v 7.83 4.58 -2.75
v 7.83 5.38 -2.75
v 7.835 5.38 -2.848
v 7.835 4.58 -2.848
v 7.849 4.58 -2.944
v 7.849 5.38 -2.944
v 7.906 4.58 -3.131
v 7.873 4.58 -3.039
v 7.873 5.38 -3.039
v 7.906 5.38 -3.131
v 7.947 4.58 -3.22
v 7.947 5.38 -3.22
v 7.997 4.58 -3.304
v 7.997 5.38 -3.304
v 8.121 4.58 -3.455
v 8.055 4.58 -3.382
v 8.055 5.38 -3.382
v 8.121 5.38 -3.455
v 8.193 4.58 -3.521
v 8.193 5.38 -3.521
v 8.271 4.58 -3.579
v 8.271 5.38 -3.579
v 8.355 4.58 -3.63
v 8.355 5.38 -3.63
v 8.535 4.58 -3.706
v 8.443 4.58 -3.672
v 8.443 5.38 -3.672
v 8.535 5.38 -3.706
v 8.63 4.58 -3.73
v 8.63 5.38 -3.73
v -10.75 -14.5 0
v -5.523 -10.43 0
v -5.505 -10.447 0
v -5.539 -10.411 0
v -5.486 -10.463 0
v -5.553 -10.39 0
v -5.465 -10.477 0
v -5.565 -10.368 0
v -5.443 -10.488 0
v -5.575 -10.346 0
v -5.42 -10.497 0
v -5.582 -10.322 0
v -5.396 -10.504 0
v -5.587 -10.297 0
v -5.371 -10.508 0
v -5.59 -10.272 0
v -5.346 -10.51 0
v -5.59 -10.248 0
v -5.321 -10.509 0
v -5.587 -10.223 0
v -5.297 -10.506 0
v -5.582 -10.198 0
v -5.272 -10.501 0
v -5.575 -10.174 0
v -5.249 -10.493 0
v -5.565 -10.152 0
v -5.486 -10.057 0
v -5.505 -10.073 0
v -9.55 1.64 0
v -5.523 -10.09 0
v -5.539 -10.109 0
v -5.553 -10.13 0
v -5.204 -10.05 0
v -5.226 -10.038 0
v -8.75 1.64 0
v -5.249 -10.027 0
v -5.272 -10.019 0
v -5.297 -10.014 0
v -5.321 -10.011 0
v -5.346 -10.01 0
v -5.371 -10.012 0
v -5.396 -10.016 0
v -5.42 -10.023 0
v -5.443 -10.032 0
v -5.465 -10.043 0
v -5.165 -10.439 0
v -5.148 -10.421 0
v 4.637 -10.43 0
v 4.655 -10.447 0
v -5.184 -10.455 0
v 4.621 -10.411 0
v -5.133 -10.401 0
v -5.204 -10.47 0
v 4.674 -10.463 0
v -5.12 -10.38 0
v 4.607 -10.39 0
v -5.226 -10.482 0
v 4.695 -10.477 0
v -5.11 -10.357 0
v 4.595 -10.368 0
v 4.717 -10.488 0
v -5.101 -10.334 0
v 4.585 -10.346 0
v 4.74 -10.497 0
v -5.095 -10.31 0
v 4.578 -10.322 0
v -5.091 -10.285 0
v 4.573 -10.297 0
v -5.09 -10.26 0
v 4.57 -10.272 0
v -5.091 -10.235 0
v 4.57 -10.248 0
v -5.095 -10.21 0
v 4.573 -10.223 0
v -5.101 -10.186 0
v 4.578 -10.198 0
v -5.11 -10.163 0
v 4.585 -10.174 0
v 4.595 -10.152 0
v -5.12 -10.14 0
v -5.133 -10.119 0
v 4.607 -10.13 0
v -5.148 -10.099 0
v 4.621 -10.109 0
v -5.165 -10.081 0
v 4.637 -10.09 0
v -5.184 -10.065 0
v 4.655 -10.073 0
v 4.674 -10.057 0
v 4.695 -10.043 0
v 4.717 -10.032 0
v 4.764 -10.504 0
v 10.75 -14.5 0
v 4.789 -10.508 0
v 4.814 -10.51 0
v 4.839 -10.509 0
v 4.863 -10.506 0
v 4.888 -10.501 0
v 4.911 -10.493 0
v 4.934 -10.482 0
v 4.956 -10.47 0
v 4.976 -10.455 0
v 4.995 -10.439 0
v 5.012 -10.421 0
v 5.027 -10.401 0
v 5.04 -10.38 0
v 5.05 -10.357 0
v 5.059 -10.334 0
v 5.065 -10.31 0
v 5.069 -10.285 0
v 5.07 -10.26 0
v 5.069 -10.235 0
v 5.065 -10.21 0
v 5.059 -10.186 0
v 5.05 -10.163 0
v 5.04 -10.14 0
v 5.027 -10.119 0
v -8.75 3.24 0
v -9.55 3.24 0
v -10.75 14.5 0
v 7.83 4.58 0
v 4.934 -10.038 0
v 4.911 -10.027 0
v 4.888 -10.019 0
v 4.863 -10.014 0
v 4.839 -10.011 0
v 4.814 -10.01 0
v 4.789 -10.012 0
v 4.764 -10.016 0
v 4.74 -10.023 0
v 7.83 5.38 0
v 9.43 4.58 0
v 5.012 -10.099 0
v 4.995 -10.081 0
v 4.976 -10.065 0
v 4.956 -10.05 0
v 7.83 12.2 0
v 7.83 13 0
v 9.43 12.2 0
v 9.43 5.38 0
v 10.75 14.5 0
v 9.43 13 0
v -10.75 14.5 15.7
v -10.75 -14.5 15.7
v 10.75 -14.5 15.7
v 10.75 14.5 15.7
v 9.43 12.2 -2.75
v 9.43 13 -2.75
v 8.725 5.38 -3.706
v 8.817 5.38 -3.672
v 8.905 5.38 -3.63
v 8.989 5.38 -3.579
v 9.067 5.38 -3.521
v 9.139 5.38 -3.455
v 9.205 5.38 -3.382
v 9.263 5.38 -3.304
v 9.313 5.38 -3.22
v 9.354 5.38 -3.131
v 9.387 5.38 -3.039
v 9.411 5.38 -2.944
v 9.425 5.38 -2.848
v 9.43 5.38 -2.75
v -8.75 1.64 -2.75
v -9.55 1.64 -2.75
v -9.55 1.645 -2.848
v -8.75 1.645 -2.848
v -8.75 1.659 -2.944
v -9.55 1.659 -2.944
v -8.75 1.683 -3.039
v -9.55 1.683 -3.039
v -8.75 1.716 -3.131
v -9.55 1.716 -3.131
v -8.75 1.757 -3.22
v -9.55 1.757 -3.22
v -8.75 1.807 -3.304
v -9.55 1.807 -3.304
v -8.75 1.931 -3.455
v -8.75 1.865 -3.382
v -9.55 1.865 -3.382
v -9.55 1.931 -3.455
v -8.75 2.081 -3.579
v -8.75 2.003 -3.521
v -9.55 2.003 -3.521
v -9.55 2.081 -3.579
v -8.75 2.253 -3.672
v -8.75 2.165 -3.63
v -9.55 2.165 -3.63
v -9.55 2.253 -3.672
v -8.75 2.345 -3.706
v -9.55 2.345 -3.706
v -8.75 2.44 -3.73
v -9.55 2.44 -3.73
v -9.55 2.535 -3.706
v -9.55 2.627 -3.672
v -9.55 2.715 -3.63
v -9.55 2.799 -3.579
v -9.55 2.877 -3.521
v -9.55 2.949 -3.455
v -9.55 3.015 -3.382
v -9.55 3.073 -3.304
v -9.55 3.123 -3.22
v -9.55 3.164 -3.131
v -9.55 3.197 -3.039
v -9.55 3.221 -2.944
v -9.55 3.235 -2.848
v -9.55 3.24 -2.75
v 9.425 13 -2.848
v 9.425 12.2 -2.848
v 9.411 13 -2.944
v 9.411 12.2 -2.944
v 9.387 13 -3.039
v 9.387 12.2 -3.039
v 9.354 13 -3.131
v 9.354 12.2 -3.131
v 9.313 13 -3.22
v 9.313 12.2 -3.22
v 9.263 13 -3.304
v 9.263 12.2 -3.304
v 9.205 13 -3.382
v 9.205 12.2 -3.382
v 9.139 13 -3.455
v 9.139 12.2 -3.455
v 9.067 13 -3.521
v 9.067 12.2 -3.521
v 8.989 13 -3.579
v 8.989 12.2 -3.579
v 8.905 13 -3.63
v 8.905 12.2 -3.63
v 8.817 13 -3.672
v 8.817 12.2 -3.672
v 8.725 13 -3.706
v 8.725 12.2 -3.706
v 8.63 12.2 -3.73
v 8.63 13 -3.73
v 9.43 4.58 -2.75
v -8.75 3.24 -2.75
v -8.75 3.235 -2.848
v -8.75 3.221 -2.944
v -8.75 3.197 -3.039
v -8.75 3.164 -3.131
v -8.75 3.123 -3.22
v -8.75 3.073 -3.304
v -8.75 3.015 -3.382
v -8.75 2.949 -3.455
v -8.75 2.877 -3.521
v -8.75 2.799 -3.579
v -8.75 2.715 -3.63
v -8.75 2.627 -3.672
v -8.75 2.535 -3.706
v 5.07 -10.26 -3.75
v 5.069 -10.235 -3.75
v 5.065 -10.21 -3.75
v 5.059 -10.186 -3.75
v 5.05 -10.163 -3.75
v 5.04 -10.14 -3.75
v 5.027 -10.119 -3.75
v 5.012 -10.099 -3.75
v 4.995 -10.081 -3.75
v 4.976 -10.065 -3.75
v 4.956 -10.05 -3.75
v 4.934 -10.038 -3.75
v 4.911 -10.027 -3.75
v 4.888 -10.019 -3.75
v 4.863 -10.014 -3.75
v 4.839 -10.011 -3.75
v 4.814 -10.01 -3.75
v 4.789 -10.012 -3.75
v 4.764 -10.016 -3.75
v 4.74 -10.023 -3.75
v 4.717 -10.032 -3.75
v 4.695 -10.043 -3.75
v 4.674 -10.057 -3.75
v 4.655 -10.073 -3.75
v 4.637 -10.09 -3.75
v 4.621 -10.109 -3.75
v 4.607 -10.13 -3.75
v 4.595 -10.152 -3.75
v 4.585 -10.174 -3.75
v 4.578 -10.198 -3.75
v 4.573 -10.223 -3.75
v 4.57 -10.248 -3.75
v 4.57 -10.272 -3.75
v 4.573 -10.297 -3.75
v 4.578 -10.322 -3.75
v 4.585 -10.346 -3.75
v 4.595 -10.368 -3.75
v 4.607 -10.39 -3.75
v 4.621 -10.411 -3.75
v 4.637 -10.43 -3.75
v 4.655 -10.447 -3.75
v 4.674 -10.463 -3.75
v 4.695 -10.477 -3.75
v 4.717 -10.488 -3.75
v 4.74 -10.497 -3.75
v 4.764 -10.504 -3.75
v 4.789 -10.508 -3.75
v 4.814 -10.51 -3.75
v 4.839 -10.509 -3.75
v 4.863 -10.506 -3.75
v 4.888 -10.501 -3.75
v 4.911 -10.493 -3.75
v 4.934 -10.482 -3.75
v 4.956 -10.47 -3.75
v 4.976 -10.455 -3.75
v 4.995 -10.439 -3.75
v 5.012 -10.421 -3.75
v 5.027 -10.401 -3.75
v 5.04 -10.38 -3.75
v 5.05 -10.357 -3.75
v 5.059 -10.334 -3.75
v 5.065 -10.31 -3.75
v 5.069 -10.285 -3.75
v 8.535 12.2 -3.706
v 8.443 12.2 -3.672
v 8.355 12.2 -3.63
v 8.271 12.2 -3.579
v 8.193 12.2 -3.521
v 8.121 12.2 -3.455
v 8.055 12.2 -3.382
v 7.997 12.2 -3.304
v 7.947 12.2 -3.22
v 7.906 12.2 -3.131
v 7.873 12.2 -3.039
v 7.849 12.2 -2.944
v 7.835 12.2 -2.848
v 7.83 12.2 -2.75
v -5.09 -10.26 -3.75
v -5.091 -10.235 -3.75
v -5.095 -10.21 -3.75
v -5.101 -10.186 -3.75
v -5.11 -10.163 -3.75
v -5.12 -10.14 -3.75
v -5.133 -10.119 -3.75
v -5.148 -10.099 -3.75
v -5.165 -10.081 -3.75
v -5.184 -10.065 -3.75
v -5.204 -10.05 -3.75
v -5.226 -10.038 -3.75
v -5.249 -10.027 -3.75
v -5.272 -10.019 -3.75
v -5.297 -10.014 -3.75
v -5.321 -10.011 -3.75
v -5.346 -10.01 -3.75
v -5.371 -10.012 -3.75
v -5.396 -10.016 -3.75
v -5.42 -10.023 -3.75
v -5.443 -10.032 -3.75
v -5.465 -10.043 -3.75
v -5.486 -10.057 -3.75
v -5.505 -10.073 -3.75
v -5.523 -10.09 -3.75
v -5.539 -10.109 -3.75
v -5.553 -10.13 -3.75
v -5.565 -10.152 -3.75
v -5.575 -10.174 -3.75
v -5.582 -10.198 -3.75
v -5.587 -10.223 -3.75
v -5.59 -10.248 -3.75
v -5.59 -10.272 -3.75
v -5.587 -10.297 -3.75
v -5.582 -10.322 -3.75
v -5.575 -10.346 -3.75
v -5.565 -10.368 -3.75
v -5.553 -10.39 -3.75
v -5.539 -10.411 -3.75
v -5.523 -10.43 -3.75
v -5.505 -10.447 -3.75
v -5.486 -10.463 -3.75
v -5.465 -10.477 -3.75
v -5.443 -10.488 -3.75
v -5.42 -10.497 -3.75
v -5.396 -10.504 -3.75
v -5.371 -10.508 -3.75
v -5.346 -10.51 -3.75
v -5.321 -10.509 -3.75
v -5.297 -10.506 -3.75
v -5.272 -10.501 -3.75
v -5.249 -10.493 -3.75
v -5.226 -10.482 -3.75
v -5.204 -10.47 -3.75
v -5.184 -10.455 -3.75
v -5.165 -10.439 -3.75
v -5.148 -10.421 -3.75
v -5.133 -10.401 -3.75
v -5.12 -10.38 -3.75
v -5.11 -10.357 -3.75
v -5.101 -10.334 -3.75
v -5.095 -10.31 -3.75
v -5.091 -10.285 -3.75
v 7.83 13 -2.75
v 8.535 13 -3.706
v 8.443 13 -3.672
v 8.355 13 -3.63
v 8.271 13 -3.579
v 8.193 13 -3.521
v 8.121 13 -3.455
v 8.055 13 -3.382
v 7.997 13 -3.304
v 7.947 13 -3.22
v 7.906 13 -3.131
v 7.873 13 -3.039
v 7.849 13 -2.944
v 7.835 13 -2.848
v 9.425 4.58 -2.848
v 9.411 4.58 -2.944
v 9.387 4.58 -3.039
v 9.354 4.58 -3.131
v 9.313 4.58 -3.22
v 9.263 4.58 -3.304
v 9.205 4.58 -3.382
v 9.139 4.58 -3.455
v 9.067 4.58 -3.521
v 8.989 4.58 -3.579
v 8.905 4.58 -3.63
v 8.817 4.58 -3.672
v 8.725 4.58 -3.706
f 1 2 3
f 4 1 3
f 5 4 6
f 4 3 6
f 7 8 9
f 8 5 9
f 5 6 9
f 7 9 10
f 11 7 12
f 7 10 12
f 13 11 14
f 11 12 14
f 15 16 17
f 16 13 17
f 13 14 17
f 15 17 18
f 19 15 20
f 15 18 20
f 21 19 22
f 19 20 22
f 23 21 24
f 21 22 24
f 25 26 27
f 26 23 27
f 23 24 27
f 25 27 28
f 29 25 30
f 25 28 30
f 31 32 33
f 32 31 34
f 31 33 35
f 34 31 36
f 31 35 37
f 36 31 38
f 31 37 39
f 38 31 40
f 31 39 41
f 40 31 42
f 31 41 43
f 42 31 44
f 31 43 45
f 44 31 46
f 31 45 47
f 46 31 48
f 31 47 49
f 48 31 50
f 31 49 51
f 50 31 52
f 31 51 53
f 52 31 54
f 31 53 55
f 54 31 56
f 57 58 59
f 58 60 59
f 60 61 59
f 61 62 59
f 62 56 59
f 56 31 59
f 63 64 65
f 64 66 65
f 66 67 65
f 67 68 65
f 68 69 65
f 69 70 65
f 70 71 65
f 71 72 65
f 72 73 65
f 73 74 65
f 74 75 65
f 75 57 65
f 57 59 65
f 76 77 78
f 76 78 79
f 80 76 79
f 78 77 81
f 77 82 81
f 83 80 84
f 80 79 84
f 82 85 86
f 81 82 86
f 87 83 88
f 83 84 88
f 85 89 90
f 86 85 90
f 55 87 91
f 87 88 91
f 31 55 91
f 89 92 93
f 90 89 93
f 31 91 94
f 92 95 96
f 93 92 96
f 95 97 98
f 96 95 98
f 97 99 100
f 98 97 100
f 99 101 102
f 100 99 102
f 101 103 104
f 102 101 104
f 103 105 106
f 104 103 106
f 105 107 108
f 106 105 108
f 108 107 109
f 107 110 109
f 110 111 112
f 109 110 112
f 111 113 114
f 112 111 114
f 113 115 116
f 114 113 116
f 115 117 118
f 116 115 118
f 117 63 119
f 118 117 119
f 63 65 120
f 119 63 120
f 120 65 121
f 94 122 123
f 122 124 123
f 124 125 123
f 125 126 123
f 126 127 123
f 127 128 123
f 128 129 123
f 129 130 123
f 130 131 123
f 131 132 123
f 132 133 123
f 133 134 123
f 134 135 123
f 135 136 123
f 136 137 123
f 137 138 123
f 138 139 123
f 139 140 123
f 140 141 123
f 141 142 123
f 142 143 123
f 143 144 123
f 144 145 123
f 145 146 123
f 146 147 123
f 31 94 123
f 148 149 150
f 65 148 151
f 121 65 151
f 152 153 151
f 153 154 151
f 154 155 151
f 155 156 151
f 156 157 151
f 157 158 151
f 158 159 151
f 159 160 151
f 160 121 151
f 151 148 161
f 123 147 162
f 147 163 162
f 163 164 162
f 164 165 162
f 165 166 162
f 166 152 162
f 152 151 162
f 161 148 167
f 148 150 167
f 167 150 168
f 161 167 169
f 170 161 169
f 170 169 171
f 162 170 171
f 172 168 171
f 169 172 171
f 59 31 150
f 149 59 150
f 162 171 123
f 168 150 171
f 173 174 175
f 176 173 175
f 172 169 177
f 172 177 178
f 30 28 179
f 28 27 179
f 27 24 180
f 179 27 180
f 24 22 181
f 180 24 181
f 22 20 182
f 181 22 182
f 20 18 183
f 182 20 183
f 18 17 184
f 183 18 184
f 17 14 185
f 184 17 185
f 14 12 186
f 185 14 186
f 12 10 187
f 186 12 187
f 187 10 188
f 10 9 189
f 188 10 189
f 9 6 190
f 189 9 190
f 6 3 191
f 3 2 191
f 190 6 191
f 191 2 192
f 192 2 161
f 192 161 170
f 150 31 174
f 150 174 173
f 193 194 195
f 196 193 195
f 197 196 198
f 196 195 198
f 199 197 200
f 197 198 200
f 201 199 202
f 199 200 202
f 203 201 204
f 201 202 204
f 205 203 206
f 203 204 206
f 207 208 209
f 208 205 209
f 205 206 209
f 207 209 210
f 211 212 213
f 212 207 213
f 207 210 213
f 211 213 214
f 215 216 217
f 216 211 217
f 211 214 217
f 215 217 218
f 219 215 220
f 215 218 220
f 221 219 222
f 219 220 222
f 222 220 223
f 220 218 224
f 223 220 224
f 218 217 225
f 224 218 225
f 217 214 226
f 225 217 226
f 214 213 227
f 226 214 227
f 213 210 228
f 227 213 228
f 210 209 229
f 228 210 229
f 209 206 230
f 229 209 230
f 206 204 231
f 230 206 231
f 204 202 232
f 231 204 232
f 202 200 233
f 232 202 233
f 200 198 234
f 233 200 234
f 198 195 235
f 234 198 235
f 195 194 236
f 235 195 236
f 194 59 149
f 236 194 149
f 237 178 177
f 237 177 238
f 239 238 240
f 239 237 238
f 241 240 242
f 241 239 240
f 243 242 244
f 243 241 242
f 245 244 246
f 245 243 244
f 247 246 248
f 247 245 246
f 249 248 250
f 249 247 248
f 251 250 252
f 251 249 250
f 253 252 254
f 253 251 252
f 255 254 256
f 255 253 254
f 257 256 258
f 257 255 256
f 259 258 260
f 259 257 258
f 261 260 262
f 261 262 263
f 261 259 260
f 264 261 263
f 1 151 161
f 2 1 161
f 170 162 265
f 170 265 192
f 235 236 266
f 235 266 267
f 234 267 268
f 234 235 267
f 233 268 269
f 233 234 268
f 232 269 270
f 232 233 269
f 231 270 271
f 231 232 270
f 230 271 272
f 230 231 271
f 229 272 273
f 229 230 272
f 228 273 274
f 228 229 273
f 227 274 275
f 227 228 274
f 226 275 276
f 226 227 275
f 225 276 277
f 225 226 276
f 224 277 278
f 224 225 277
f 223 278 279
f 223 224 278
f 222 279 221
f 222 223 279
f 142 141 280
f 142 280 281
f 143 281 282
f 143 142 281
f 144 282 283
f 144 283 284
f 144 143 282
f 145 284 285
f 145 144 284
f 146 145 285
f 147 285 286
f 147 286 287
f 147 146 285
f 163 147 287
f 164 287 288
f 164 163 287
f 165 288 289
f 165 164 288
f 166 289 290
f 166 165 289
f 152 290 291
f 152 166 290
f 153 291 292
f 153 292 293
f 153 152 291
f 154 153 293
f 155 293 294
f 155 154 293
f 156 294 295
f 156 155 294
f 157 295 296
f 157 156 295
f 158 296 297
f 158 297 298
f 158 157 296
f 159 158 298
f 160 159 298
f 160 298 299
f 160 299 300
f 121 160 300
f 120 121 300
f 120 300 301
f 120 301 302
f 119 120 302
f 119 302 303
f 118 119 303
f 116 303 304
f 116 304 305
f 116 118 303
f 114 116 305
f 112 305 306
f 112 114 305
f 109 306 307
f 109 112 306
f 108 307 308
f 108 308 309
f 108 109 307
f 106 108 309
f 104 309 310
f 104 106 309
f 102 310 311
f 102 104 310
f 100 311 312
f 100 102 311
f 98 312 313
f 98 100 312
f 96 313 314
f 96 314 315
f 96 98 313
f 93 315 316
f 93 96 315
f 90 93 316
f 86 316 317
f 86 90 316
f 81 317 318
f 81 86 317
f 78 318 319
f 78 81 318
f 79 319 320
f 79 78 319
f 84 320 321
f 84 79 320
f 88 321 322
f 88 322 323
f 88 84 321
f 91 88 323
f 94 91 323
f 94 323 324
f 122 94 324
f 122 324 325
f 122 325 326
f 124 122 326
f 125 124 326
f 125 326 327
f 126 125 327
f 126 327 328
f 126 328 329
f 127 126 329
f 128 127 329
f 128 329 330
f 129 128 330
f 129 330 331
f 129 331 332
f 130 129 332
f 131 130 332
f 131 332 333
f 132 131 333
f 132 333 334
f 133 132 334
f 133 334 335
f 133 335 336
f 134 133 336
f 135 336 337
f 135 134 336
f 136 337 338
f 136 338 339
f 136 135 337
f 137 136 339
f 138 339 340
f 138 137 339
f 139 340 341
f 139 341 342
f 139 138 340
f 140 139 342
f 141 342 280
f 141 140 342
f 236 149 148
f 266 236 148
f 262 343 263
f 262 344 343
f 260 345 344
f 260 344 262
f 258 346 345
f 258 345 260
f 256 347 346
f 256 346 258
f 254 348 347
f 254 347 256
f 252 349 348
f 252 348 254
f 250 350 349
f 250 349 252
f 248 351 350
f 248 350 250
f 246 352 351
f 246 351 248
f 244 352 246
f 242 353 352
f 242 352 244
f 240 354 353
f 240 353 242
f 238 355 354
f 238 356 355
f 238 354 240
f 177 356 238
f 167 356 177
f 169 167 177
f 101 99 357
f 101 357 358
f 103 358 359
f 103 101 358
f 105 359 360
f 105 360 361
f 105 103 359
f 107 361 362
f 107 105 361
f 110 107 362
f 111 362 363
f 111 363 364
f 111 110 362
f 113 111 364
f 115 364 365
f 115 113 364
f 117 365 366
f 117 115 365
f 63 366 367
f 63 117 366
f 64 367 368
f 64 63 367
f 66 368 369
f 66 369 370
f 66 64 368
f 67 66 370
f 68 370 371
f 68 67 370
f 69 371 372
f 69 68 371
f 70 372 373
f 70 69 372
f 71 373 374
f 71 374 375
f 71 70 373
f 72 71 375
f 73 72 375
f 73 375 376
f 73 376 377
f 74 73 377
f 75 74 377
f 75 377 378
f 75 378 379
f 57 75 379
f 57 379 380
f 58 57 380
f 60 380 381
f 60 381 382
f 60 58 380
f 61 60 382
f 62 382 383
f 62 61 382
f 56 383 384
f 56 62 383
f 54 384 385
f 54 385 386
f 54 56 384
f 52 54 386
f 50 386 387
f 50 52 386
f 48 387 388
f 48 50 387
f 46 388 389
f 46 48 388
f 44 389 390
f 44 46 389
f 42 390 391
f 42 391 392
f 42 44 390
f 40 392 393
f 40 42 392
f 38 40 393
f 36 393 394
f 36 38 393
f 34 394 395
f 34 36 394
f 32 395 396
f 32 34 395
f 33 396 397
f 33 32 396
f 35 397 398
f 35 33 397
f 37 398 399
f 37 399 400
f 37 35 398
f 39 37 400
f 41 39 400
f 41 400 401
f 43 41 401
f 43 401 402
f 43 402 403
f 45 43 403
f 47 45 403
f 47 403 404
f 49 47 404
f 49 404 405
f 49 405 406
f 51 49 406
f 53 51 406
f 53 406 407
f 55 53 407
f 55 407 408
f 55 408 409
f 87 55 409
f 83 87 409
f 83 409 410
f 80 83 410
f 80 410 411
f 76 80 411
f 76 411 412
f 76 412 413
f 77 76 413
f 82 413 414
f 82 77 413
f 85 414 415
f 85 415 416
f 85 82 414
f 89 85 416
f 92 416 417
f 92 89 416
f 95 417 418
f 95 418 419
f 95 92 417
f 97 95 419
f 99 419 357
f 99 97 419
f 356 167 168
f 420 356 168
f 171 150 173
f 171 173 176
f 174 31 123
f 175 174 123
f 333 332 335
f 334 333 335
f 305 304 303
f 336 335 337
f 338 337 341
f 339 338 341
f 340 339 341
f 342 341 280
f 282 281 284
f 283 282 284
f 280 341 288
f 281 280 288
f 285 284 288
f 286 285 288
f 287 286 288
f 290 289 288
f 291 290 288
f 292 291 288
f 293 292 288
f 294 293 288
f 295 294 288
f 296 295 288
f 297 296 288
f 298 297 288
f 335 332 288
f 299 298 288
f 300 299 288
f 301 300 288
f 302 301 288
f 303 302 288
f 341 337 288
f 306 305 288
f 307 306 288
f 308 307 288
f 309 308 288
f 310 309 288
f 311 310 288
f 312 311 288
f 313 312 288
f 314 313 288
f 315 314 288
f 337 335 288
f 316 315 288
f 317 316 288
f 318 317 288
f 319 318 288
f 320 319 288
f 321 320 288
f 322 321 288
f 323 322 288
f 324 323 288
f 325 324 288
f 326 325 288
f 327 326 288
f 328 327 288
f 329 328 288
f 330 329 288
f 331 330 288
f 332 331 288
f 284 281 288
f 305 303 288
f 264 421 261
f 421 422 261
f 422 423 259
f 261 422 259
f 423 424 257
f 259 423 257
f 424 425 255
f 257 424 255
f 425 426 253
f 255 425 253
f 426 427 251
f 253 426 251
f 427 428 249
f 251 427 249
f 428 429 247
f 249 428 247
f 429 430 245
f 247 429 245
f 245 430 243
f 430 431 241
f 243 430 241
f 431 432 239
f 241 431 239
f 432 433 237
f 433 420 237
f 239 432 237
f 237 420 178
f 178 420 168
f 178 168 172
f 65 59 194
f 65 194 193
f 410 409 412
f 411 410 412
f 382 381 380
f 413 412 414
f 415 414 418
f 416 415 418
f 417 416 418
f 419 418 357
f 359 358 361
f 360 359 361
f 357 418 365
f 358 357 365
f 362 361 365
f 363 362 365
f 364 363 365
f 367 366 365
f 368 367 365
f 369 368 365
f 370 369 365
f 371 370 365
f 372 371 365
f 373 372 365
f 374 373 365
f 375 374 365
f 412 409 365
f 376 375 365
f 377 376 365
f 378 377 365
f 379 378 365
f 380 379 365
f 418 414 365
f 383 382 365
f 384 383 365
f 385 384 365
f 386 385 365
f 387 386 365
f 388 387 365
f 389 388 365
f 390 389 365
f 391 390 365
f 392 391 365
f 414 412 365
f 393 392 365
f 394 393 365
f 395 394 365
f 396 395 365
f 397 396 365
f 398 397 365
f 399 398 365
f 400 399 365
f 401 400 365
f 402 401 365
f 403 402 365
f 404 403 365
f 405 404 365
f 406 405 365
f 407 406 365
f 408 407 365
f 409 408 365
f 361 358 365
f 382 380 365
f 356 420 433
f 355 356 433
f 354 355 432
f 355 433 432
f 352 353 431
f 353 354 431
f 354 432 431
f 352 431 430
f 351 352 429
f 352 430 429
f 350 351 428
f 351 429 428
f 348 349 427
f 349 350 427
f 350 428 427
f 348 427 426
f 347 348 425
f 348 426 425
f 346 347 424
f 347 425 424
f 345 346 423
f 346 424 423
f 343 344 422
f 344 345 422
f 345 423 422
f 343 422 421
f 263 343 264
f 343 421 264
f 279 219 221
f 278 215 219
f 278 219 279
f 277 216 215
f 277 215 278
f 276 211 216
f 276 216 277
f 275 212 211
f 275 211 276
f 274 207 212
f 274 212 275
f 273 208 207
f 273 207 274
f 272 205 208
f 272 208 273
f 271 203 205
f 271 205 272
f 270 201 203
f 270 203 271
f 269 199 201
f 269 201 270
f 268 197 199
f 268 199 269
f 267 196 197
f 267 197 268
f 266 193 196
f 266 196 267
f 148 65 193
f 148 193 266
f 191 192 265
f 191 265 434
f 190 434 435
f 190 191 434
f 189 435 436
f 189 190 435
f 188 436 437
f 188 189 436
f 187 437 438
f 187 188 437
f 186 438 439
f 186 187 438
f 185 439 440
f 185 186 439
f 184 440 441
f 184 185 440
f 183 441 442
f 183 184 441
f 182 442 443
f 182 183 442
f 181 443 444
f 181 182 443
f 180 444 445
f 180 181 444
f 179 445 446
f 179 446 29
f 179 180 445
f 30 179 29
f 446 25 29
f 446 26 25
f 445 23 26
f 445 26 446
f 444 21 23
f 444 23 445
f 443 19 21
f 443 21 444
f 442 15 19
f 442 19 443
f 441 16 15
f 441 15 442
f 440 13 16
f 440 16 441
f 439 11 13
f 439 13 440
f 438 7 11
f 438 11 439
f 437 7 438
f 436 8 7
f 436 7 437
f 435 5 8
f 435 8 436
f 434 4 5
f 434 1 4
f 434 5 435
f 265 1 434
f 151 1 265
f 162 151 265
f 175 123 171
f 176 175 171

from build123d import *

# Parameters (mm, degrees)
F0_W        = 21.5
F0_H        = 29
F1_DEPTH    = 15.7
F2_W        = 1.6
F2_H        = 0.8
F2_R        = 0.25
F2_W_2      = 0.8
F2_H_2      = 1.6
F3_DEPTH    = 3.75
F4_T1_DEPTH = 5.8
F4_T3_DEPTH = 5.8
F4_T5_DEPTH = 5.8


# Not quite as in the source:
# - a fillet or chamfer that OpenCascade refuses, or shapes differently, is made with other operations: its cross-section is extruded or revolved along the edge and cut away or added


with BuildPart() as f1:
    # F0 (on Top) → F1 (new body)
    with BuildSketch(Plane.XY):
        Rectangle(F0_W, F0_H)
    extrude(amount=F1_DEPTH)

    # F2 (on face) → F3 (join)
    with BuildSketch(Plane.XY):
        with Locations((8.63, 12.6)):
            Rectangle(F2_W, F2_H)
        with Locations((8.63, 4.98)):
            Rectangle(F2_W, F2_H)
        with Locations((-5.34, -10.26)):
            Circle(F2_R)
        with Locations((4.82, -10.26)):
            Circle(F2_R)
        with Locations((-9.15, 2.44)):
            Rectangle(F2_W_2, F2_H_2)
    extrude(amount=-F3_DEPTH)

    # F4: fillet of radius 1 on 6 edges, made by hand

    # F4_s2 → F4_t1 (cut)
    with BuildSketch(Plane.XZ.offset(-15.5)):
        with BuildLine():
            ThreePointArc((7.83, -2.75), (8.1228932188, -3.4571067812), (8.83, -3.75))
            Line((8.83, -3.75), (7.83, -3.75))
            Line((7.83, -3.75), (7.83, -2.75))
        make_face()
        with BuildLine():
            ThreePointArc((9.43, -2.75), (9.1371067812, -3.4571067812), (8.43, -3.75))
            Line((8.43, -3.75), (9.43, -3.75))
            Line((9.43, -3.75), (9.43, -2.75))
        make_face()
    extrude(amount=F4_T1_DEPTH, mode=Mode.SUBTRACT)

    # F4_s4 → F4_t3 (cut)
    with BuildSketch(Plane.XZ.offset(-7.88)):
        with BuildLine():
            ThreePointArc((7.83, -2.75), (8.1228932188, -3.4571067812), (8.83, -3.75))
            Line((8.83, -3.75), (7.83, -3.75))
            Line((7.83, -3.75), (7.83, -2.75))
        make_face()
        with BuildLine():
            ThreePointArc((9.43, -2.75), (9.1371067812, -3.4571067812), (8.43, -3.75))
            Line((8.43, -3.75), (9.43, -3.75))
            Line((9.43, -3.75), (9.43, -2.75))
        make_face()
    extrude(amount=F4_T3_DEPTH, mode=Mode.SUBTRACT)

    # F4_s6 → F4_t5 (cut)
    with BuildSketch(Plane.YZ.offset(-12.05)):
        with BuildLine():
            ThreePointArc((1.64, -2.75), (1.9328932188, -3.4571067812), (2.64, -3.75))
            Line((2.64, -3.75), (1.64, -3.75))
            Line((1.64, -3.75), (1.64, -2.75))
        make_face()
        with BuildLine():
            ThreePointArc((3.24, -2.75), (2.9471067812, -3.4571067812), (2.24, -3.75))
            Line((2.24, -3.75), (3.24, -3.75))
            Line((3.24, -3.75), (3.24, -2.75))
        make_face()
    extrude(amount=F4_T5_DEPTH, mode=Mode.SUBTRACT)


solid = f1.part
